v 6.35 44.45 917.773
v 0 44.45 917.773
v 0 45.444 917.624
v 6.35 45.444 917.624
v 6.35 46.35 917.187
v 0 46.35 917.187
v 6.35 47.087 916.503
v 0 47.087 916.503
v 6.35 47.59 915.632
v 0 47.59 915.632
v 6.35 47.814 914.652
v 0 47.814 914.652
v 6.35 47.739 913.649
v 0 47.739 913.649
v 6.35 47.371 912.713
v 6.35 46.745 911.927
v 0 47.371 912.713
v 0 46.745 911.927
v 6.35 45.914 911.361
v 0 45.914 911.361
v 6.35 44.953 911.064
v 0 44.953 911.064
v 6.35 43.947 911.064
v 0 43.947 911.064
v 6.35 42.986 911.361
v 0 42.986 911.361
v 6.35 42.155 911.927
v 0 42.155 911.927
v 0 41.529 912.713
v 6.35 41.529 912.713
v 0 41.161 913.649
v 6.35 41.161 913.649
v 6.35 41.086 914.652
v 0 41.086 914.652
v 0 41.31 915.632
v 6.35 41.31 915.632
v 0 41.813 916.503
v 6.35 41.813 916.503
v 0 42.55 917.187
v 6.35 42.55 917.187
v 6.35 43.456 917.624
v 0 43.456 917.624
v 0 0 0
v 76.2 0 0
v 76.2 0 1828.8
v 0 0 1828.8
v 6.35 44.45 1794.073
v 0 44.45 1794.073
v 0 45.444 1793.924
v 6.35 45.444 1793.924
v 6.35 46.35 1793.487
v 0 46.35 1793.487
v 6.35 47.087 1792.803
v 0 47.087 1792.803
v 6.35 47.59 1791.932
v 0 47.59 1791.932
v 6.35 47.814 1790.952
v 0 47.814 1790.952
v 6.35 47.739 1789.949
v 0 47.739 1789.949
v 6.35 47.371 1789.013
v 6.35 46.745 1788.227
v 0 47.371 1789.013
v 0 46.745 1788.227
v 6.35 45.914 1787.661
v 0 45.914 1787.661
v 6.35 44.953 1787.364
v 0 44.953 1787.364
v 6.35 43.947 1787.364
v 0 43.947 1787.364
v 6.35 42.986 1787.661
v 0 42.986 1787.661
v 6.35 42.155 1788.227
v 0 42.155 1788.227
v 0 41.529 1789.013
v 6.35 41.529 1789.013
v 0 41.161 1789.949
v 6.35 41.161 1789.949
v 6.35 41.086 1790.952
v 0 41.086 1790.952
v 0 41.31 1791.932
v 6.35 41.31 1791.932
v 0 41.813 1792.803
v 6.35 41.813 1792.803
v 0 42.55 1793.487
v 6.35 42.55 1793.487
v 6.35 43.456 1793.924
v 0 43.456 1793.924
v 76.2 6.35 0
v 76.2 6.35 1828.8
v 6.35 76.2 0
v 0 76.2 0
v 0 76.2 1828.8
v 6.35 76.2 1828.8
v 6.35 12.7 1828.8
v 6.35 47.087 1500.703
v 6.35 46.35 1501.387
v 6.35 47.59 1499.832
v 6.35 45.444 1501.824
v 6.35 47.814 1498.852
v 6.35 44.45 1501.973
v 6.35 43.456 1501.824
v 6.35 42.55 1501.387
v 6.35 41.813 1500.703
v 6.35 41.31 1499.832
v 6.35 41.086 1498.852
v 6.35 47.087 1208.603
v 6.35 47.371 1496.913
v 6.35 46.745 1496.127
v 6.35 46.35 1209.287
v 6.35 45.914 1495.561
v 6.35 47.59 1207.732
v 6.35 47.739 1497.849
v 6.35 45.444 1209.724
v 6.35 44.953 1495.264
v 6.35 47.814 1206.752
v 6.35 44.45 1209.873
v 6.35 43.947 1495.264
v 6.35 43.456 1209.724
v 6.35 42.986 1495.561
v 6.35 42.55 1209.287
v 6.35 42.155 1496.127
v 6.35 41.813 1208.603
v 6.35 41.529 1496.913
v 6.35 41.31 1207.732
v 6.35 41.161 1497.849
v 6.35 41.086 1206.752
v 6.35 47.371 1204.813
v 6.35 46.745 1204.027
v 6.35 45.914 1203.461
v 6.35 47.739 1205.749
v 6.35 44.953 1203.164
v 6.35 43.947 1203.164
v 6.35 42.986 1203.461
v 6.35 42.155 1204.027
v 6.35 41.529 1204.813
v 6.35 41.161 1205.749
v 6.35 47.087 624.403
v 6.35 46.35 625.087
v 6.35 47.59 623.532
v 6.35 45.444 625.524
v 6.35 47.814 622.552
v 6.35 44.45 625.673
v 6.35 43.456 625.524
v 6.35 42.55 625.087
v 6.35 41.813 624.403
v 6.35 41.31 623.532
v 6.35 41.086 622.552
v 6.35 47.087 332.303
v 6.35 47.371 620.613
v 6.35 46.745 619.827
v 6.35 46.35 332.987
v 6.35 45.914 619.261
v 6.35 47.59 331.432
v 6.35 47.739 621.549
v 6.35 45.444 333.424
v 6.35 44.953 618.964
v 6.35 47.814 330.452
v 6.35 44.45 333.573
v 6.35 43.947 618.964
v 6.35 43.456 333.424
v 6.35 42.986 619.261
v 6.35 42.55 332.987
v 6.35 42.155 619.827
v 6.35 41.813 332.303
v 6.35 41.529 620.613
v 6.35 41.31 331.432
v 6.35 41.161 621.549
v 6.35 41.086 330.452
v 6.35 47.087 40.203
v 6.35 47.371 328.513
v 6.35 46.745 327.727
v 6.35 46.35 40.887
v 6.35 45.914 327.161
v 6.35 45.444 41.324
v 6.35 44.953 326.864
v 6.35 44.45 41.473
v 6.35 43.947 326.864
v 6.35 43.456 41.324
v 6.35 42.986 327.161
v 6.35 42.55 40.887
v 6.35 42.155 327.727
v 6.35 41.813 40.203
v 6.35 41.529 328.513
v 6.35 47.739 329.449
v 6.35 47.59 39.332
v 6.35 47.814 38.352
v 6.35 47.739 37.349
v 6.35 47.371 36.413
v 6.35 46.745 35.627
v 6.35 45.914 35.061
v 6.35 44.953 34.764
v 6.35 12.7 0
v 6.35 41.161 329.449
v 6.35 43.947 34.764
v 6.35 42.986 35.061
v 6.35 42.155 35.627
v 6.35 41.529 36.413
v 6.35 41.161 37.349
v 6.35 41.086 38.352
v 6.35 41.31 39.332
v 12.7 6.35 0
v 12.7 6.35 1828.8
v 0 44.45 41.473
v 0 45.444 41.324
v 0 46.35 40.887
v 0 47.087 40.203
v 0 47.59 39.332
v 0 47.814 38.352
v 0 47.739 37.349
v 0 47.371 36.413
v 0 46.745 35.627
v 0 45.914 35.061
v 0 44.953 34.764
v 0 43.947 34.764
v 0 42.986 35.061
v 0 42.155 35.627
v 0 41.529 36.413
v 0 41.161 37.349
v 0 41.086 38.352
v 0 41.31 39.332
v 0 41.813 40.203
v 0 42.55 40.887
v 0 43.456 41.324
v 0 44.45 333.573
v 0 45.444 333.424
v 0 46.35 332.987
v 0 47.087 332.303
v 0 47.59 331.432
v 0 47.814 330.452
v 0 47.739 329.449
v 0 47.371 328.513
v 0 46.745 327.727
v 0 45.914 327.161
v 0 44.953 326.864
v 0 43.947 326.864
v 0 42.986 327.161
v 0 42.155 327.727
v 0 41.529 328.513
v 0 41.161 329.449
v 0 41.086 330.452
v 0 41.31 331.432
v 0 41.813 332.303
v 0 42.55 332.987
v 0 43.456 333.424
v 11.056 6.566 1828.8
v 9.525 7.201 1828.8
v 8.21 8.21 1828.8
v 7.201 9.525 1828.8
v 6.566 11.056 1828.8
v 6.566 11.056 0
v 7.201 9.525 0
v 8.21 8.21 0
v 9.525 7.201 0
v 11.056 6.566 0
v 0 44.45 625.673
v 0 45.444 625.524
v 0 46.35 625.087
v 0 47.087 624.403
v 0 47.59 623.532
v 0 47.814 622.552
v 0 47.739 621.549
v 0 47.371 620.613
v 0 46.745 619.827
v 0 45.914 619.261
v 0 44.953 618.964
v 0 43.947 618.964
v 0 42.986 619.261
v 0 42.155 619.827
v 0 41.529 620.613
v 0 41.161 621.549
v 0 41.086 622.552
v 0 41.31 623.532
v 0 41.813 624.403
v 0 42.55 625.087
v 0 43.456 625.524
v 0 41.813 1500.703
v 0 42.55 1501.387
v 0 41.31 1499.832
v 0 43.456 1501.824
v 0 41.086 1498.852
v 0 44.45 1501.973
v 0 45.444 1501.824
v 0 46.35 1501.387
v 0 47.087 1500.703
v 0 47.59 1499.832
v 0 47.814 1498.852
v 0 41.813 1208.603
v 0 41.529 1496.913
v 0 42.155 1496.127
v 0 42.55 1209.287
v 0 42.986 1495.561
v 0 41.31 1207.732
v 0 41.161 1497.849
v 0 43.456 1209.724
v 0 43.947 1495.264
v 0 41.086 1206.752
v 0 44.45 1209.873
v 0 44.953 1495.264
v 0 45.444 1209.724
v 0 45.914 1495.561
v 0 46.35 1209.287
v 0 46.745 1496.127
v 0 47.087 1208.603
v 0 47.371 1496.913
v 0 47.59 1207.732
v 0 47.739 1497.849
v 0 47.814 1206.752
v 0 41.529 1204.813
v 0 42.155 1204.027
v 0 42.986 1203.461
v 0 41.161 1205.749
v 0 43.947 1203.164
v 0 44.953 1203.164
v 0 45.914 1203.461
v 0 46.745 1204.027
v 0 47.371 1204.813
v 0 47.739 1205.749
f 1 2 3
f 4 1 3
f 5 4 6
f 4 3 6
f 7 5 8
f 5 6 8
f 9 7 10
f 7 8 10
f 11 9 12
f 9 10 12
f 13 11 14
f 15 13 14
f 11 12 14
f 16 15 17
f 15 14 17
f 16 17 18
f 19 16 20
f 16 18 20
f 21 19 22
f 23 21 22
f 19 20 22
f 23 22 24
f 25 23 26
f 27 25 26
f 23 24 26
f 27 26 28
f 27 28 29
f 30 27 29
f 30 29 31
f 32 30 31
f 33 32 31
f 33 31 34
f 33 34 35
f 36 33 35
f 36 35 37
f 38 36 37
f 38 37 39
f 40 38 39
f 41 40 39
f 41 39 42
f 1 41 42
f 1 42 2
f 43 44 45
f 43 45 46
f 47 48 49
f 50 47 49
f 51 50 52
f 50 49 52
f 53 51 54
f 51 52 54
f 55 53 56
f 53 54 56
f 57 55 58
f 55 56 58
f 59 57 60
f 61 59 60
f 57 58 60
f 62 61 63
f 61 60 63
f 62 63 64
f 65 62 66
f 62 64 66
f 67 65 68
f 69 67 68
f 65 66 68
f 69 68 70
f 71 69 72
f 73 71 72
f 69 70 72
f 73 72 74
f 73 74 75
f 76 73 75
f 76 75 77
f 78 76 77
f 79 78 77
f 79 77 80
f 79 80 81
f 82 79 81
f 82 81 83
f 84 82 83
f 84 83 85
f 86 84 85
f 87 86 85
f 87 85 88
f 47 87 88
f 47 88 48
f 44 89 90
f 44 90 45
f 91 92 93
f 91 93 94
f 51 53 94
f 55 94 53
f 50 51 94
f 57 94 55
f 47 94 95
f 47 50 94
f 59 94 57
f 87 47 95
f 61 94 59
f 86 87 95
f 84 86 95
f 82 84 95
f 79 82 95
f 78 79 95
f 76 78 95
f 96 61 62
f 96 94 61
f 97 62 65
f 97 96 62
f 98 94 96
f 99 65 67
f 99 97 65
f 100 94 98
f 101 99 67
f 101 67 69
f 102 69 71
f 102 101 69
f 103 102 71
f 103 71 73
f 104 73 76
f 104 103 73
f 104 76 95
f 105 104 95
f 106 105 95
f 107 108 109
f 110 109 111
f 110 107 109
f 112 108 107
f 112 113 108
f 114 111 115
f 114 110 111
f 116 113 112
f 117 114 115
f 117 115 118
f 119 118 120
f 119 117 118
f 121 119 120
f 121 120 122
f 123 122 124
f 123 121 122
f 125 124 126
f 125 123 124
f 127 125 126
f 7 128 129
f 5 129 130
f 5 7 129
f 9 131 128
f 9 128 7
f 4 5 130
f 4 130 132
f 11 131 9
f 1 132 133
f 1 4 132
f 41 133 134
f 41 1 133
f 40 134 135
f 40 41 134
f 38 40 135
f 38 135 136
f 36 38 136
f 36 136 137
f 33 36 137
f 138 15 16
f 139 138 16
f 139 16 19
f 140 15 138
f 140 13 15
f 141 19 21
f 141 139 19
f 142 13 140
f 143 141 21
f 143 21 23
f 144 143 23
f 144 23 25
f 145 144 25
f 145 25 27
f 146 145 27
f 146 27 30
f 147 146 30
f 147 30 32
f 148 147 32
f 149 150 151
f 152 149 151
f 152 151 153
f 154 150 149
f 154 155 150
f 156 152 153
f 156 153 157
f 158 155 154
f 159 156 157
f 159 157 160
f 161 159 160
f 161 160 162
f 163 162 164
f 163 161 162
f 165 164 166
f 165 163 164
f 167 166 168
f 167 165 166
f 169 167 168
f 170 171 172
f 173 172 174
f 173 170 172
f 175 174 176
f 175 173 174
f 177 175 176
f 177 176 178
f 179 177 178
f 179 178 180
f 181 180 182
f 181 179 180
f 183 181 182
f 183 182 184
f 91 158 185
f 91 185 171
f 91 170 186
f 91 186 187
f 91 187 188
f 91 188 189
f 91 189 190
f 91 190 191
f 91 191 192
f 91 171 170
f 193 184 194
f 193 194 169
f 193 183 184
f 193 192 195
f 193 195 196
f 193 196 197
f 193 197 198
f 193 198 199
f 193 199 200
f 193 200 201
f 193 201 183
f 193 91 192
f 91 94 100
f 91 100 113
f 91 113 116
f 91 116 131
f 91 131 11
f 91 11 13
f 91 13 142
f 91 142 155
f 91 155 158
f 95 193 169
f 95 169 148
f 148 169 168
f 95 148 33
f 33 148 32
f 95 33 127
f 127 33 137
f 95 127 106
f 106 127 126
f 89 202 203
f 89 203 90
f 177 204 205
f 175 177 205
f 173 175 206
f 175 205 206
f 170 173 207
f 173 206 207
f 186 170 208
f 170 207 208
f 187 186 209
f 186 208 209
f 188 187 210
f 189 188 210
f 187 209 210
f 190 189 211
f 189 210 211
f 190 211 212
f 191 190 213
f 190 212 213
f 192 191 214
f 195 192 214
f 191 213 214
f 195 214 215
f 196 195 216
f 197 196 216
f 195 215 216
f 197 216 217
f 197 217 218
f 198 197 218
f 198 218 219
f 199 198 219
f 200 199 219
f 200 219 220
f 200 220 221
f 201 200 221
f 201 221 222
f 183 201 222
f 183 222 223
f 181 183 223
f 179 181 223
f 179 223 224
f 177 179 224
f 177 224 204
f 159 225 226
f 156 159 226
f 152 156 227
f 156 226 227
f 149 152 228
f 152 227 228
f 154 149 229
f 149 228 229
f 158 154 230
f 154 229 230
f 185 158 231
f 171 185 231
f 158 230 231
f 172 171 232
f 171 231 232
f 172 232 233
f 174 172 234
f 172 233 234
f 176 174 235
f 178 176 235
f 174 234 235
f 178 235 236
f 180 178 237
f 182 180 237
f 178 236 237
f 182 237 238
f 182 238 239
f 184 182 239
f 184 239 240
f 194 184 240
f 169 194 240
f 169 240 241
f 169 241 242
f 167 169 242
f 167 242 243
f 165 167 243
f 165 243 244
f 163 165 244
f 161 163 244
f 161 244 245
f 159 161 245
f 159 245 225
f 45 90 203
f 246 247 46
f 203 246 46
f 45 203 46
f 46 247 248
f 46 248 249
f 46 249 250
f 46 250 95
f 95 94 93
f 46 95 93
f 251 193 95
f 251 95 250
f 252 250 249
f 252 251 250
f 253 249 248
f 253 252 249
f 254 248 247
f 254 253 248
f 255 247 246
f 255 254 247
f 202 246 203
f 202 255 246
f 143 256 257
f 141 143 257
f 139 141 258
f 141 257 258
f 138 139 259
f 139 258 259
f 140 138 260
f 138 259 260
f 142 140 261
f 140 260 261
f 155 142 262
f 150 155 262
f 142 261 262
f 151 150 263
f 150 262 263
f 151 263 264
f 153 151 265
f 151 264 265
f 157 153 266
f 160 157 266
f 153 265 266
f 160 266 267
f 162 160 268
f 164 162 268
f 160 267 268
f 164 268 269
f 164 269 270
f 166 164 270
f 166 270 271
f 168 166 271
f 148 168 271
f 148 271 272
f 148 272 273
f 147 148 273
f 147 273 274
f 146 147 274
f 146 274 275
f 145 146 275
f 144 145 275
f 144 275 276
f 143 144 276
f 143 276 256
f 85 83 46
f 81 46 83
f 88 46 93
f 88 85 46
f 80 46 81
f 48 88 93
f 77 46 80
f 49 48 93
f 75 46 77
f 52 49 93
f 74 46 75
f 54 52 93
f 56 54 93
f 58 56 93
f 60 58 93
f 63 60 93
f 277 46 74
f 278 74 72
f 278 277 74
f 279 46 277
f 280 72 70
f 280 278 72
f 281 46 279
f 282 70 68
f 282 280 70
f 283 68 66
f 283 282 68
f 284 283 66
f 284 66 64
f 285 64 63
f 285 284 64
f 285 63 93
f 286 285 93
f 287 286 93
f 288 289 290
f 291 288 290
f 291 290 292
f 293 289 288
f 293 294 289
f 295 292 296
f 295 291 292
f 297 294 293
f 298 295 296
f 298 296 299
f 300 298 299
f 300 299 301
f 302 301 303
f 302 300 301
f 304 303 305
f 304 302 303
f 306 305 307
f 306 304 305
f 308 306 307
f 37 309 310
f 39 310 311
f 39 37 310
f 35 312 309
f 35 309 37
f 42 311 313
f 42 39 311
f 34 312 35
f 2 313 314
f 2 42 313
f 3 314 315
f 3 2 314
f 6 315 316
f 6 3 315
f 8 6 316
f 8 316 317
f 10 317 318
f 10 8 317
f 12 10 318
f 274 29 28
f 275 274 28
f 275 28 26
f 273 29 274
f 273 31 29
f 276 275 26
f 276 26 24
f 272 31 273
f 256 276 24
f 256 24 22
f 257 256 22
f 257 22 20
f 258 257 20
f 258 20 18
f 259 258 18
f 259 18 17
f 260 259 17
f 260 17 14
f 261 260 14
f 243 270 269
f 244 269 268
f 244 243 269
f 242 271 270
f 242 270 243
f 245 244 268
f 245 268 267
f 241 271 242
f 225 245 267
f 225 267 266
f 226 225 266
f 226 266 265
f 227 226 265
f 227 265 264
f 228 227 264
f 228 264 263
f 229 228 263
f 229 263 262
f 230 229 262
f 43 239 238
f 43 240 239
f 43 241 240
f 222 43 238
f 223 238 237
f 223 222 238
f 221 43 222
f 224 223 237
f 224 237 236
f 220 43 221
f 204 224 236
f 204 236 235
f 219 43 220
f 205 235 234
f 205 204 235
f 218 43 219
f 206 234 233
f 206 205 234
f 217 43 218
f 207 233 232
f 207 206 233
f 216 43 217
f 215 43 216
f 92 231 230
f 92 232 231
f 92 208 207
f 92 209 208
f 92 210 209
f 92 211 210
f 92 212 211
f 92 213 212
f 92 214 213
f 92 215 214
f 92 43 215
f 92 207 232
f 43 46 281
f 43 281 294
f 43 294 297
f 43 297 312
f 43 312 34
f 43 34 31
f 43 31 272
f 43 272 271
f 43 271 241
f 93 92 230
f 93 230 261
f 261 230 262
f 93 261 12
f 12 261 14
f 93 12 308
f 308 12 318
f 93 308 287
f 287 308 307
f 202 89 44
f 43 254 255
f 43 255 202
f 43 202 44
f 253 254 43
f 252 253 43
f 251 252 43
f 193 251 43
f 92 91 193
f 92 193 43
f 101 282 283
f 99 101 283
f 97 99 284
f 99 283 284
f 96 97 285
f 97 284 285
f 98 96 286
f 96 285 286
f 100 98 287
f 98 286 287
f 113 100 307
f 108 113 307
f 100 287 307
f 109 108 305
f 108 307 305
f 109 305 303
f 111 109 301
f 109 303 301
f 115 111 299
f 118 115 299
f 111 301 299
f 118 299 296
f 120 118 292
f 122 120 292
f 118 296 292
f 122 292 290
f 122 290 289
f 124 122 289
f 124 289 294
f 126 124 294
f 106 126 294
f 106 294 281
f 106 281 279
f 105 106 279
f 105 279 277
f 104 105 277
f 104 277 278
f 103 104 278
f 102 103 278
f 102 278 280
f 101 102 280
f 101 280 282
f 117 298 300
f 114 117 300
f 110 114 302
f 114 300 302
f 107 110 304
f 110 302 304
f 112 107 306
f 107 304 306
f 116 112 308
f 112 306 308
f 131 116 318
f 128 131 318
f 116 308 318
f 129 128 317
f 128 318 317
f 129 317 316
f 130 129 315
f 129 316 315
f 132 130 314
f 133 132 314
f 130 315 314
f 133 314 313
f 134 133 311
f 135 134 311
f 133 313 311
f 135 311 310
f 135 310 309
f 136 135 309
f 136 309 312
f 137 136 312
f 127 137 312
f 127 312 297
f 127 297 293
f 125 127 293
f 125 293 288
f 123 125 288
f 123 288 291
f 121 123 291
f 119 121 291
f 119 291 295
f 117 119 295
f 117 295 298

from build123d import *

# Parameters (mm, degrees)
BOSS_EXTRUDE1_DEPTH             = 1828.8
F_0_25_6_74688_DIAMETER_HOLE1_D = 6.74688


with BuildPart() as part:
    # Sketch1 → Boss-Extrude1 (new body)
    with BuildSketch(Plane.XY):
        with BuildLine():
            Line((0, 0), (0, 76.2))
            Line((0, 76.2), (6.35, 76.2))
            Line((6.35, 76.2), (6.35, 12.7))
            ThreePointArc((6.35, 12.7), (8.209871939, 8.209871939), (12.7, 6.35))
            Line((12.7, 6.35), (76.2, 6.35))
            Line((76.2, 6.35), (76.2, 0))
            Line((76.2, 0), (0, 0))
        make_face()
    extrude(amount=BOSS_EXTRUDE1_DEPTH)

    # Ø0.25 (6.74688) Diameter Hole1 (through all)
    with Locations(Plane(origin=(6.35, 0, 0), x_dir=(0, 0, -1), z_dir=(1, 0, 0))):
        with Locations((-1790.7, 44.45), (-1498.6, 44.45), (-1206.5, 44.45), (-914.4, 44.45), (-622.3, 44.45), (-330.2, 44.45), (-38.1, 44.45)):
            Hole(F_0_25_6_74688_DIAMETER_HOLE1_D / 2)


solid = part.part
